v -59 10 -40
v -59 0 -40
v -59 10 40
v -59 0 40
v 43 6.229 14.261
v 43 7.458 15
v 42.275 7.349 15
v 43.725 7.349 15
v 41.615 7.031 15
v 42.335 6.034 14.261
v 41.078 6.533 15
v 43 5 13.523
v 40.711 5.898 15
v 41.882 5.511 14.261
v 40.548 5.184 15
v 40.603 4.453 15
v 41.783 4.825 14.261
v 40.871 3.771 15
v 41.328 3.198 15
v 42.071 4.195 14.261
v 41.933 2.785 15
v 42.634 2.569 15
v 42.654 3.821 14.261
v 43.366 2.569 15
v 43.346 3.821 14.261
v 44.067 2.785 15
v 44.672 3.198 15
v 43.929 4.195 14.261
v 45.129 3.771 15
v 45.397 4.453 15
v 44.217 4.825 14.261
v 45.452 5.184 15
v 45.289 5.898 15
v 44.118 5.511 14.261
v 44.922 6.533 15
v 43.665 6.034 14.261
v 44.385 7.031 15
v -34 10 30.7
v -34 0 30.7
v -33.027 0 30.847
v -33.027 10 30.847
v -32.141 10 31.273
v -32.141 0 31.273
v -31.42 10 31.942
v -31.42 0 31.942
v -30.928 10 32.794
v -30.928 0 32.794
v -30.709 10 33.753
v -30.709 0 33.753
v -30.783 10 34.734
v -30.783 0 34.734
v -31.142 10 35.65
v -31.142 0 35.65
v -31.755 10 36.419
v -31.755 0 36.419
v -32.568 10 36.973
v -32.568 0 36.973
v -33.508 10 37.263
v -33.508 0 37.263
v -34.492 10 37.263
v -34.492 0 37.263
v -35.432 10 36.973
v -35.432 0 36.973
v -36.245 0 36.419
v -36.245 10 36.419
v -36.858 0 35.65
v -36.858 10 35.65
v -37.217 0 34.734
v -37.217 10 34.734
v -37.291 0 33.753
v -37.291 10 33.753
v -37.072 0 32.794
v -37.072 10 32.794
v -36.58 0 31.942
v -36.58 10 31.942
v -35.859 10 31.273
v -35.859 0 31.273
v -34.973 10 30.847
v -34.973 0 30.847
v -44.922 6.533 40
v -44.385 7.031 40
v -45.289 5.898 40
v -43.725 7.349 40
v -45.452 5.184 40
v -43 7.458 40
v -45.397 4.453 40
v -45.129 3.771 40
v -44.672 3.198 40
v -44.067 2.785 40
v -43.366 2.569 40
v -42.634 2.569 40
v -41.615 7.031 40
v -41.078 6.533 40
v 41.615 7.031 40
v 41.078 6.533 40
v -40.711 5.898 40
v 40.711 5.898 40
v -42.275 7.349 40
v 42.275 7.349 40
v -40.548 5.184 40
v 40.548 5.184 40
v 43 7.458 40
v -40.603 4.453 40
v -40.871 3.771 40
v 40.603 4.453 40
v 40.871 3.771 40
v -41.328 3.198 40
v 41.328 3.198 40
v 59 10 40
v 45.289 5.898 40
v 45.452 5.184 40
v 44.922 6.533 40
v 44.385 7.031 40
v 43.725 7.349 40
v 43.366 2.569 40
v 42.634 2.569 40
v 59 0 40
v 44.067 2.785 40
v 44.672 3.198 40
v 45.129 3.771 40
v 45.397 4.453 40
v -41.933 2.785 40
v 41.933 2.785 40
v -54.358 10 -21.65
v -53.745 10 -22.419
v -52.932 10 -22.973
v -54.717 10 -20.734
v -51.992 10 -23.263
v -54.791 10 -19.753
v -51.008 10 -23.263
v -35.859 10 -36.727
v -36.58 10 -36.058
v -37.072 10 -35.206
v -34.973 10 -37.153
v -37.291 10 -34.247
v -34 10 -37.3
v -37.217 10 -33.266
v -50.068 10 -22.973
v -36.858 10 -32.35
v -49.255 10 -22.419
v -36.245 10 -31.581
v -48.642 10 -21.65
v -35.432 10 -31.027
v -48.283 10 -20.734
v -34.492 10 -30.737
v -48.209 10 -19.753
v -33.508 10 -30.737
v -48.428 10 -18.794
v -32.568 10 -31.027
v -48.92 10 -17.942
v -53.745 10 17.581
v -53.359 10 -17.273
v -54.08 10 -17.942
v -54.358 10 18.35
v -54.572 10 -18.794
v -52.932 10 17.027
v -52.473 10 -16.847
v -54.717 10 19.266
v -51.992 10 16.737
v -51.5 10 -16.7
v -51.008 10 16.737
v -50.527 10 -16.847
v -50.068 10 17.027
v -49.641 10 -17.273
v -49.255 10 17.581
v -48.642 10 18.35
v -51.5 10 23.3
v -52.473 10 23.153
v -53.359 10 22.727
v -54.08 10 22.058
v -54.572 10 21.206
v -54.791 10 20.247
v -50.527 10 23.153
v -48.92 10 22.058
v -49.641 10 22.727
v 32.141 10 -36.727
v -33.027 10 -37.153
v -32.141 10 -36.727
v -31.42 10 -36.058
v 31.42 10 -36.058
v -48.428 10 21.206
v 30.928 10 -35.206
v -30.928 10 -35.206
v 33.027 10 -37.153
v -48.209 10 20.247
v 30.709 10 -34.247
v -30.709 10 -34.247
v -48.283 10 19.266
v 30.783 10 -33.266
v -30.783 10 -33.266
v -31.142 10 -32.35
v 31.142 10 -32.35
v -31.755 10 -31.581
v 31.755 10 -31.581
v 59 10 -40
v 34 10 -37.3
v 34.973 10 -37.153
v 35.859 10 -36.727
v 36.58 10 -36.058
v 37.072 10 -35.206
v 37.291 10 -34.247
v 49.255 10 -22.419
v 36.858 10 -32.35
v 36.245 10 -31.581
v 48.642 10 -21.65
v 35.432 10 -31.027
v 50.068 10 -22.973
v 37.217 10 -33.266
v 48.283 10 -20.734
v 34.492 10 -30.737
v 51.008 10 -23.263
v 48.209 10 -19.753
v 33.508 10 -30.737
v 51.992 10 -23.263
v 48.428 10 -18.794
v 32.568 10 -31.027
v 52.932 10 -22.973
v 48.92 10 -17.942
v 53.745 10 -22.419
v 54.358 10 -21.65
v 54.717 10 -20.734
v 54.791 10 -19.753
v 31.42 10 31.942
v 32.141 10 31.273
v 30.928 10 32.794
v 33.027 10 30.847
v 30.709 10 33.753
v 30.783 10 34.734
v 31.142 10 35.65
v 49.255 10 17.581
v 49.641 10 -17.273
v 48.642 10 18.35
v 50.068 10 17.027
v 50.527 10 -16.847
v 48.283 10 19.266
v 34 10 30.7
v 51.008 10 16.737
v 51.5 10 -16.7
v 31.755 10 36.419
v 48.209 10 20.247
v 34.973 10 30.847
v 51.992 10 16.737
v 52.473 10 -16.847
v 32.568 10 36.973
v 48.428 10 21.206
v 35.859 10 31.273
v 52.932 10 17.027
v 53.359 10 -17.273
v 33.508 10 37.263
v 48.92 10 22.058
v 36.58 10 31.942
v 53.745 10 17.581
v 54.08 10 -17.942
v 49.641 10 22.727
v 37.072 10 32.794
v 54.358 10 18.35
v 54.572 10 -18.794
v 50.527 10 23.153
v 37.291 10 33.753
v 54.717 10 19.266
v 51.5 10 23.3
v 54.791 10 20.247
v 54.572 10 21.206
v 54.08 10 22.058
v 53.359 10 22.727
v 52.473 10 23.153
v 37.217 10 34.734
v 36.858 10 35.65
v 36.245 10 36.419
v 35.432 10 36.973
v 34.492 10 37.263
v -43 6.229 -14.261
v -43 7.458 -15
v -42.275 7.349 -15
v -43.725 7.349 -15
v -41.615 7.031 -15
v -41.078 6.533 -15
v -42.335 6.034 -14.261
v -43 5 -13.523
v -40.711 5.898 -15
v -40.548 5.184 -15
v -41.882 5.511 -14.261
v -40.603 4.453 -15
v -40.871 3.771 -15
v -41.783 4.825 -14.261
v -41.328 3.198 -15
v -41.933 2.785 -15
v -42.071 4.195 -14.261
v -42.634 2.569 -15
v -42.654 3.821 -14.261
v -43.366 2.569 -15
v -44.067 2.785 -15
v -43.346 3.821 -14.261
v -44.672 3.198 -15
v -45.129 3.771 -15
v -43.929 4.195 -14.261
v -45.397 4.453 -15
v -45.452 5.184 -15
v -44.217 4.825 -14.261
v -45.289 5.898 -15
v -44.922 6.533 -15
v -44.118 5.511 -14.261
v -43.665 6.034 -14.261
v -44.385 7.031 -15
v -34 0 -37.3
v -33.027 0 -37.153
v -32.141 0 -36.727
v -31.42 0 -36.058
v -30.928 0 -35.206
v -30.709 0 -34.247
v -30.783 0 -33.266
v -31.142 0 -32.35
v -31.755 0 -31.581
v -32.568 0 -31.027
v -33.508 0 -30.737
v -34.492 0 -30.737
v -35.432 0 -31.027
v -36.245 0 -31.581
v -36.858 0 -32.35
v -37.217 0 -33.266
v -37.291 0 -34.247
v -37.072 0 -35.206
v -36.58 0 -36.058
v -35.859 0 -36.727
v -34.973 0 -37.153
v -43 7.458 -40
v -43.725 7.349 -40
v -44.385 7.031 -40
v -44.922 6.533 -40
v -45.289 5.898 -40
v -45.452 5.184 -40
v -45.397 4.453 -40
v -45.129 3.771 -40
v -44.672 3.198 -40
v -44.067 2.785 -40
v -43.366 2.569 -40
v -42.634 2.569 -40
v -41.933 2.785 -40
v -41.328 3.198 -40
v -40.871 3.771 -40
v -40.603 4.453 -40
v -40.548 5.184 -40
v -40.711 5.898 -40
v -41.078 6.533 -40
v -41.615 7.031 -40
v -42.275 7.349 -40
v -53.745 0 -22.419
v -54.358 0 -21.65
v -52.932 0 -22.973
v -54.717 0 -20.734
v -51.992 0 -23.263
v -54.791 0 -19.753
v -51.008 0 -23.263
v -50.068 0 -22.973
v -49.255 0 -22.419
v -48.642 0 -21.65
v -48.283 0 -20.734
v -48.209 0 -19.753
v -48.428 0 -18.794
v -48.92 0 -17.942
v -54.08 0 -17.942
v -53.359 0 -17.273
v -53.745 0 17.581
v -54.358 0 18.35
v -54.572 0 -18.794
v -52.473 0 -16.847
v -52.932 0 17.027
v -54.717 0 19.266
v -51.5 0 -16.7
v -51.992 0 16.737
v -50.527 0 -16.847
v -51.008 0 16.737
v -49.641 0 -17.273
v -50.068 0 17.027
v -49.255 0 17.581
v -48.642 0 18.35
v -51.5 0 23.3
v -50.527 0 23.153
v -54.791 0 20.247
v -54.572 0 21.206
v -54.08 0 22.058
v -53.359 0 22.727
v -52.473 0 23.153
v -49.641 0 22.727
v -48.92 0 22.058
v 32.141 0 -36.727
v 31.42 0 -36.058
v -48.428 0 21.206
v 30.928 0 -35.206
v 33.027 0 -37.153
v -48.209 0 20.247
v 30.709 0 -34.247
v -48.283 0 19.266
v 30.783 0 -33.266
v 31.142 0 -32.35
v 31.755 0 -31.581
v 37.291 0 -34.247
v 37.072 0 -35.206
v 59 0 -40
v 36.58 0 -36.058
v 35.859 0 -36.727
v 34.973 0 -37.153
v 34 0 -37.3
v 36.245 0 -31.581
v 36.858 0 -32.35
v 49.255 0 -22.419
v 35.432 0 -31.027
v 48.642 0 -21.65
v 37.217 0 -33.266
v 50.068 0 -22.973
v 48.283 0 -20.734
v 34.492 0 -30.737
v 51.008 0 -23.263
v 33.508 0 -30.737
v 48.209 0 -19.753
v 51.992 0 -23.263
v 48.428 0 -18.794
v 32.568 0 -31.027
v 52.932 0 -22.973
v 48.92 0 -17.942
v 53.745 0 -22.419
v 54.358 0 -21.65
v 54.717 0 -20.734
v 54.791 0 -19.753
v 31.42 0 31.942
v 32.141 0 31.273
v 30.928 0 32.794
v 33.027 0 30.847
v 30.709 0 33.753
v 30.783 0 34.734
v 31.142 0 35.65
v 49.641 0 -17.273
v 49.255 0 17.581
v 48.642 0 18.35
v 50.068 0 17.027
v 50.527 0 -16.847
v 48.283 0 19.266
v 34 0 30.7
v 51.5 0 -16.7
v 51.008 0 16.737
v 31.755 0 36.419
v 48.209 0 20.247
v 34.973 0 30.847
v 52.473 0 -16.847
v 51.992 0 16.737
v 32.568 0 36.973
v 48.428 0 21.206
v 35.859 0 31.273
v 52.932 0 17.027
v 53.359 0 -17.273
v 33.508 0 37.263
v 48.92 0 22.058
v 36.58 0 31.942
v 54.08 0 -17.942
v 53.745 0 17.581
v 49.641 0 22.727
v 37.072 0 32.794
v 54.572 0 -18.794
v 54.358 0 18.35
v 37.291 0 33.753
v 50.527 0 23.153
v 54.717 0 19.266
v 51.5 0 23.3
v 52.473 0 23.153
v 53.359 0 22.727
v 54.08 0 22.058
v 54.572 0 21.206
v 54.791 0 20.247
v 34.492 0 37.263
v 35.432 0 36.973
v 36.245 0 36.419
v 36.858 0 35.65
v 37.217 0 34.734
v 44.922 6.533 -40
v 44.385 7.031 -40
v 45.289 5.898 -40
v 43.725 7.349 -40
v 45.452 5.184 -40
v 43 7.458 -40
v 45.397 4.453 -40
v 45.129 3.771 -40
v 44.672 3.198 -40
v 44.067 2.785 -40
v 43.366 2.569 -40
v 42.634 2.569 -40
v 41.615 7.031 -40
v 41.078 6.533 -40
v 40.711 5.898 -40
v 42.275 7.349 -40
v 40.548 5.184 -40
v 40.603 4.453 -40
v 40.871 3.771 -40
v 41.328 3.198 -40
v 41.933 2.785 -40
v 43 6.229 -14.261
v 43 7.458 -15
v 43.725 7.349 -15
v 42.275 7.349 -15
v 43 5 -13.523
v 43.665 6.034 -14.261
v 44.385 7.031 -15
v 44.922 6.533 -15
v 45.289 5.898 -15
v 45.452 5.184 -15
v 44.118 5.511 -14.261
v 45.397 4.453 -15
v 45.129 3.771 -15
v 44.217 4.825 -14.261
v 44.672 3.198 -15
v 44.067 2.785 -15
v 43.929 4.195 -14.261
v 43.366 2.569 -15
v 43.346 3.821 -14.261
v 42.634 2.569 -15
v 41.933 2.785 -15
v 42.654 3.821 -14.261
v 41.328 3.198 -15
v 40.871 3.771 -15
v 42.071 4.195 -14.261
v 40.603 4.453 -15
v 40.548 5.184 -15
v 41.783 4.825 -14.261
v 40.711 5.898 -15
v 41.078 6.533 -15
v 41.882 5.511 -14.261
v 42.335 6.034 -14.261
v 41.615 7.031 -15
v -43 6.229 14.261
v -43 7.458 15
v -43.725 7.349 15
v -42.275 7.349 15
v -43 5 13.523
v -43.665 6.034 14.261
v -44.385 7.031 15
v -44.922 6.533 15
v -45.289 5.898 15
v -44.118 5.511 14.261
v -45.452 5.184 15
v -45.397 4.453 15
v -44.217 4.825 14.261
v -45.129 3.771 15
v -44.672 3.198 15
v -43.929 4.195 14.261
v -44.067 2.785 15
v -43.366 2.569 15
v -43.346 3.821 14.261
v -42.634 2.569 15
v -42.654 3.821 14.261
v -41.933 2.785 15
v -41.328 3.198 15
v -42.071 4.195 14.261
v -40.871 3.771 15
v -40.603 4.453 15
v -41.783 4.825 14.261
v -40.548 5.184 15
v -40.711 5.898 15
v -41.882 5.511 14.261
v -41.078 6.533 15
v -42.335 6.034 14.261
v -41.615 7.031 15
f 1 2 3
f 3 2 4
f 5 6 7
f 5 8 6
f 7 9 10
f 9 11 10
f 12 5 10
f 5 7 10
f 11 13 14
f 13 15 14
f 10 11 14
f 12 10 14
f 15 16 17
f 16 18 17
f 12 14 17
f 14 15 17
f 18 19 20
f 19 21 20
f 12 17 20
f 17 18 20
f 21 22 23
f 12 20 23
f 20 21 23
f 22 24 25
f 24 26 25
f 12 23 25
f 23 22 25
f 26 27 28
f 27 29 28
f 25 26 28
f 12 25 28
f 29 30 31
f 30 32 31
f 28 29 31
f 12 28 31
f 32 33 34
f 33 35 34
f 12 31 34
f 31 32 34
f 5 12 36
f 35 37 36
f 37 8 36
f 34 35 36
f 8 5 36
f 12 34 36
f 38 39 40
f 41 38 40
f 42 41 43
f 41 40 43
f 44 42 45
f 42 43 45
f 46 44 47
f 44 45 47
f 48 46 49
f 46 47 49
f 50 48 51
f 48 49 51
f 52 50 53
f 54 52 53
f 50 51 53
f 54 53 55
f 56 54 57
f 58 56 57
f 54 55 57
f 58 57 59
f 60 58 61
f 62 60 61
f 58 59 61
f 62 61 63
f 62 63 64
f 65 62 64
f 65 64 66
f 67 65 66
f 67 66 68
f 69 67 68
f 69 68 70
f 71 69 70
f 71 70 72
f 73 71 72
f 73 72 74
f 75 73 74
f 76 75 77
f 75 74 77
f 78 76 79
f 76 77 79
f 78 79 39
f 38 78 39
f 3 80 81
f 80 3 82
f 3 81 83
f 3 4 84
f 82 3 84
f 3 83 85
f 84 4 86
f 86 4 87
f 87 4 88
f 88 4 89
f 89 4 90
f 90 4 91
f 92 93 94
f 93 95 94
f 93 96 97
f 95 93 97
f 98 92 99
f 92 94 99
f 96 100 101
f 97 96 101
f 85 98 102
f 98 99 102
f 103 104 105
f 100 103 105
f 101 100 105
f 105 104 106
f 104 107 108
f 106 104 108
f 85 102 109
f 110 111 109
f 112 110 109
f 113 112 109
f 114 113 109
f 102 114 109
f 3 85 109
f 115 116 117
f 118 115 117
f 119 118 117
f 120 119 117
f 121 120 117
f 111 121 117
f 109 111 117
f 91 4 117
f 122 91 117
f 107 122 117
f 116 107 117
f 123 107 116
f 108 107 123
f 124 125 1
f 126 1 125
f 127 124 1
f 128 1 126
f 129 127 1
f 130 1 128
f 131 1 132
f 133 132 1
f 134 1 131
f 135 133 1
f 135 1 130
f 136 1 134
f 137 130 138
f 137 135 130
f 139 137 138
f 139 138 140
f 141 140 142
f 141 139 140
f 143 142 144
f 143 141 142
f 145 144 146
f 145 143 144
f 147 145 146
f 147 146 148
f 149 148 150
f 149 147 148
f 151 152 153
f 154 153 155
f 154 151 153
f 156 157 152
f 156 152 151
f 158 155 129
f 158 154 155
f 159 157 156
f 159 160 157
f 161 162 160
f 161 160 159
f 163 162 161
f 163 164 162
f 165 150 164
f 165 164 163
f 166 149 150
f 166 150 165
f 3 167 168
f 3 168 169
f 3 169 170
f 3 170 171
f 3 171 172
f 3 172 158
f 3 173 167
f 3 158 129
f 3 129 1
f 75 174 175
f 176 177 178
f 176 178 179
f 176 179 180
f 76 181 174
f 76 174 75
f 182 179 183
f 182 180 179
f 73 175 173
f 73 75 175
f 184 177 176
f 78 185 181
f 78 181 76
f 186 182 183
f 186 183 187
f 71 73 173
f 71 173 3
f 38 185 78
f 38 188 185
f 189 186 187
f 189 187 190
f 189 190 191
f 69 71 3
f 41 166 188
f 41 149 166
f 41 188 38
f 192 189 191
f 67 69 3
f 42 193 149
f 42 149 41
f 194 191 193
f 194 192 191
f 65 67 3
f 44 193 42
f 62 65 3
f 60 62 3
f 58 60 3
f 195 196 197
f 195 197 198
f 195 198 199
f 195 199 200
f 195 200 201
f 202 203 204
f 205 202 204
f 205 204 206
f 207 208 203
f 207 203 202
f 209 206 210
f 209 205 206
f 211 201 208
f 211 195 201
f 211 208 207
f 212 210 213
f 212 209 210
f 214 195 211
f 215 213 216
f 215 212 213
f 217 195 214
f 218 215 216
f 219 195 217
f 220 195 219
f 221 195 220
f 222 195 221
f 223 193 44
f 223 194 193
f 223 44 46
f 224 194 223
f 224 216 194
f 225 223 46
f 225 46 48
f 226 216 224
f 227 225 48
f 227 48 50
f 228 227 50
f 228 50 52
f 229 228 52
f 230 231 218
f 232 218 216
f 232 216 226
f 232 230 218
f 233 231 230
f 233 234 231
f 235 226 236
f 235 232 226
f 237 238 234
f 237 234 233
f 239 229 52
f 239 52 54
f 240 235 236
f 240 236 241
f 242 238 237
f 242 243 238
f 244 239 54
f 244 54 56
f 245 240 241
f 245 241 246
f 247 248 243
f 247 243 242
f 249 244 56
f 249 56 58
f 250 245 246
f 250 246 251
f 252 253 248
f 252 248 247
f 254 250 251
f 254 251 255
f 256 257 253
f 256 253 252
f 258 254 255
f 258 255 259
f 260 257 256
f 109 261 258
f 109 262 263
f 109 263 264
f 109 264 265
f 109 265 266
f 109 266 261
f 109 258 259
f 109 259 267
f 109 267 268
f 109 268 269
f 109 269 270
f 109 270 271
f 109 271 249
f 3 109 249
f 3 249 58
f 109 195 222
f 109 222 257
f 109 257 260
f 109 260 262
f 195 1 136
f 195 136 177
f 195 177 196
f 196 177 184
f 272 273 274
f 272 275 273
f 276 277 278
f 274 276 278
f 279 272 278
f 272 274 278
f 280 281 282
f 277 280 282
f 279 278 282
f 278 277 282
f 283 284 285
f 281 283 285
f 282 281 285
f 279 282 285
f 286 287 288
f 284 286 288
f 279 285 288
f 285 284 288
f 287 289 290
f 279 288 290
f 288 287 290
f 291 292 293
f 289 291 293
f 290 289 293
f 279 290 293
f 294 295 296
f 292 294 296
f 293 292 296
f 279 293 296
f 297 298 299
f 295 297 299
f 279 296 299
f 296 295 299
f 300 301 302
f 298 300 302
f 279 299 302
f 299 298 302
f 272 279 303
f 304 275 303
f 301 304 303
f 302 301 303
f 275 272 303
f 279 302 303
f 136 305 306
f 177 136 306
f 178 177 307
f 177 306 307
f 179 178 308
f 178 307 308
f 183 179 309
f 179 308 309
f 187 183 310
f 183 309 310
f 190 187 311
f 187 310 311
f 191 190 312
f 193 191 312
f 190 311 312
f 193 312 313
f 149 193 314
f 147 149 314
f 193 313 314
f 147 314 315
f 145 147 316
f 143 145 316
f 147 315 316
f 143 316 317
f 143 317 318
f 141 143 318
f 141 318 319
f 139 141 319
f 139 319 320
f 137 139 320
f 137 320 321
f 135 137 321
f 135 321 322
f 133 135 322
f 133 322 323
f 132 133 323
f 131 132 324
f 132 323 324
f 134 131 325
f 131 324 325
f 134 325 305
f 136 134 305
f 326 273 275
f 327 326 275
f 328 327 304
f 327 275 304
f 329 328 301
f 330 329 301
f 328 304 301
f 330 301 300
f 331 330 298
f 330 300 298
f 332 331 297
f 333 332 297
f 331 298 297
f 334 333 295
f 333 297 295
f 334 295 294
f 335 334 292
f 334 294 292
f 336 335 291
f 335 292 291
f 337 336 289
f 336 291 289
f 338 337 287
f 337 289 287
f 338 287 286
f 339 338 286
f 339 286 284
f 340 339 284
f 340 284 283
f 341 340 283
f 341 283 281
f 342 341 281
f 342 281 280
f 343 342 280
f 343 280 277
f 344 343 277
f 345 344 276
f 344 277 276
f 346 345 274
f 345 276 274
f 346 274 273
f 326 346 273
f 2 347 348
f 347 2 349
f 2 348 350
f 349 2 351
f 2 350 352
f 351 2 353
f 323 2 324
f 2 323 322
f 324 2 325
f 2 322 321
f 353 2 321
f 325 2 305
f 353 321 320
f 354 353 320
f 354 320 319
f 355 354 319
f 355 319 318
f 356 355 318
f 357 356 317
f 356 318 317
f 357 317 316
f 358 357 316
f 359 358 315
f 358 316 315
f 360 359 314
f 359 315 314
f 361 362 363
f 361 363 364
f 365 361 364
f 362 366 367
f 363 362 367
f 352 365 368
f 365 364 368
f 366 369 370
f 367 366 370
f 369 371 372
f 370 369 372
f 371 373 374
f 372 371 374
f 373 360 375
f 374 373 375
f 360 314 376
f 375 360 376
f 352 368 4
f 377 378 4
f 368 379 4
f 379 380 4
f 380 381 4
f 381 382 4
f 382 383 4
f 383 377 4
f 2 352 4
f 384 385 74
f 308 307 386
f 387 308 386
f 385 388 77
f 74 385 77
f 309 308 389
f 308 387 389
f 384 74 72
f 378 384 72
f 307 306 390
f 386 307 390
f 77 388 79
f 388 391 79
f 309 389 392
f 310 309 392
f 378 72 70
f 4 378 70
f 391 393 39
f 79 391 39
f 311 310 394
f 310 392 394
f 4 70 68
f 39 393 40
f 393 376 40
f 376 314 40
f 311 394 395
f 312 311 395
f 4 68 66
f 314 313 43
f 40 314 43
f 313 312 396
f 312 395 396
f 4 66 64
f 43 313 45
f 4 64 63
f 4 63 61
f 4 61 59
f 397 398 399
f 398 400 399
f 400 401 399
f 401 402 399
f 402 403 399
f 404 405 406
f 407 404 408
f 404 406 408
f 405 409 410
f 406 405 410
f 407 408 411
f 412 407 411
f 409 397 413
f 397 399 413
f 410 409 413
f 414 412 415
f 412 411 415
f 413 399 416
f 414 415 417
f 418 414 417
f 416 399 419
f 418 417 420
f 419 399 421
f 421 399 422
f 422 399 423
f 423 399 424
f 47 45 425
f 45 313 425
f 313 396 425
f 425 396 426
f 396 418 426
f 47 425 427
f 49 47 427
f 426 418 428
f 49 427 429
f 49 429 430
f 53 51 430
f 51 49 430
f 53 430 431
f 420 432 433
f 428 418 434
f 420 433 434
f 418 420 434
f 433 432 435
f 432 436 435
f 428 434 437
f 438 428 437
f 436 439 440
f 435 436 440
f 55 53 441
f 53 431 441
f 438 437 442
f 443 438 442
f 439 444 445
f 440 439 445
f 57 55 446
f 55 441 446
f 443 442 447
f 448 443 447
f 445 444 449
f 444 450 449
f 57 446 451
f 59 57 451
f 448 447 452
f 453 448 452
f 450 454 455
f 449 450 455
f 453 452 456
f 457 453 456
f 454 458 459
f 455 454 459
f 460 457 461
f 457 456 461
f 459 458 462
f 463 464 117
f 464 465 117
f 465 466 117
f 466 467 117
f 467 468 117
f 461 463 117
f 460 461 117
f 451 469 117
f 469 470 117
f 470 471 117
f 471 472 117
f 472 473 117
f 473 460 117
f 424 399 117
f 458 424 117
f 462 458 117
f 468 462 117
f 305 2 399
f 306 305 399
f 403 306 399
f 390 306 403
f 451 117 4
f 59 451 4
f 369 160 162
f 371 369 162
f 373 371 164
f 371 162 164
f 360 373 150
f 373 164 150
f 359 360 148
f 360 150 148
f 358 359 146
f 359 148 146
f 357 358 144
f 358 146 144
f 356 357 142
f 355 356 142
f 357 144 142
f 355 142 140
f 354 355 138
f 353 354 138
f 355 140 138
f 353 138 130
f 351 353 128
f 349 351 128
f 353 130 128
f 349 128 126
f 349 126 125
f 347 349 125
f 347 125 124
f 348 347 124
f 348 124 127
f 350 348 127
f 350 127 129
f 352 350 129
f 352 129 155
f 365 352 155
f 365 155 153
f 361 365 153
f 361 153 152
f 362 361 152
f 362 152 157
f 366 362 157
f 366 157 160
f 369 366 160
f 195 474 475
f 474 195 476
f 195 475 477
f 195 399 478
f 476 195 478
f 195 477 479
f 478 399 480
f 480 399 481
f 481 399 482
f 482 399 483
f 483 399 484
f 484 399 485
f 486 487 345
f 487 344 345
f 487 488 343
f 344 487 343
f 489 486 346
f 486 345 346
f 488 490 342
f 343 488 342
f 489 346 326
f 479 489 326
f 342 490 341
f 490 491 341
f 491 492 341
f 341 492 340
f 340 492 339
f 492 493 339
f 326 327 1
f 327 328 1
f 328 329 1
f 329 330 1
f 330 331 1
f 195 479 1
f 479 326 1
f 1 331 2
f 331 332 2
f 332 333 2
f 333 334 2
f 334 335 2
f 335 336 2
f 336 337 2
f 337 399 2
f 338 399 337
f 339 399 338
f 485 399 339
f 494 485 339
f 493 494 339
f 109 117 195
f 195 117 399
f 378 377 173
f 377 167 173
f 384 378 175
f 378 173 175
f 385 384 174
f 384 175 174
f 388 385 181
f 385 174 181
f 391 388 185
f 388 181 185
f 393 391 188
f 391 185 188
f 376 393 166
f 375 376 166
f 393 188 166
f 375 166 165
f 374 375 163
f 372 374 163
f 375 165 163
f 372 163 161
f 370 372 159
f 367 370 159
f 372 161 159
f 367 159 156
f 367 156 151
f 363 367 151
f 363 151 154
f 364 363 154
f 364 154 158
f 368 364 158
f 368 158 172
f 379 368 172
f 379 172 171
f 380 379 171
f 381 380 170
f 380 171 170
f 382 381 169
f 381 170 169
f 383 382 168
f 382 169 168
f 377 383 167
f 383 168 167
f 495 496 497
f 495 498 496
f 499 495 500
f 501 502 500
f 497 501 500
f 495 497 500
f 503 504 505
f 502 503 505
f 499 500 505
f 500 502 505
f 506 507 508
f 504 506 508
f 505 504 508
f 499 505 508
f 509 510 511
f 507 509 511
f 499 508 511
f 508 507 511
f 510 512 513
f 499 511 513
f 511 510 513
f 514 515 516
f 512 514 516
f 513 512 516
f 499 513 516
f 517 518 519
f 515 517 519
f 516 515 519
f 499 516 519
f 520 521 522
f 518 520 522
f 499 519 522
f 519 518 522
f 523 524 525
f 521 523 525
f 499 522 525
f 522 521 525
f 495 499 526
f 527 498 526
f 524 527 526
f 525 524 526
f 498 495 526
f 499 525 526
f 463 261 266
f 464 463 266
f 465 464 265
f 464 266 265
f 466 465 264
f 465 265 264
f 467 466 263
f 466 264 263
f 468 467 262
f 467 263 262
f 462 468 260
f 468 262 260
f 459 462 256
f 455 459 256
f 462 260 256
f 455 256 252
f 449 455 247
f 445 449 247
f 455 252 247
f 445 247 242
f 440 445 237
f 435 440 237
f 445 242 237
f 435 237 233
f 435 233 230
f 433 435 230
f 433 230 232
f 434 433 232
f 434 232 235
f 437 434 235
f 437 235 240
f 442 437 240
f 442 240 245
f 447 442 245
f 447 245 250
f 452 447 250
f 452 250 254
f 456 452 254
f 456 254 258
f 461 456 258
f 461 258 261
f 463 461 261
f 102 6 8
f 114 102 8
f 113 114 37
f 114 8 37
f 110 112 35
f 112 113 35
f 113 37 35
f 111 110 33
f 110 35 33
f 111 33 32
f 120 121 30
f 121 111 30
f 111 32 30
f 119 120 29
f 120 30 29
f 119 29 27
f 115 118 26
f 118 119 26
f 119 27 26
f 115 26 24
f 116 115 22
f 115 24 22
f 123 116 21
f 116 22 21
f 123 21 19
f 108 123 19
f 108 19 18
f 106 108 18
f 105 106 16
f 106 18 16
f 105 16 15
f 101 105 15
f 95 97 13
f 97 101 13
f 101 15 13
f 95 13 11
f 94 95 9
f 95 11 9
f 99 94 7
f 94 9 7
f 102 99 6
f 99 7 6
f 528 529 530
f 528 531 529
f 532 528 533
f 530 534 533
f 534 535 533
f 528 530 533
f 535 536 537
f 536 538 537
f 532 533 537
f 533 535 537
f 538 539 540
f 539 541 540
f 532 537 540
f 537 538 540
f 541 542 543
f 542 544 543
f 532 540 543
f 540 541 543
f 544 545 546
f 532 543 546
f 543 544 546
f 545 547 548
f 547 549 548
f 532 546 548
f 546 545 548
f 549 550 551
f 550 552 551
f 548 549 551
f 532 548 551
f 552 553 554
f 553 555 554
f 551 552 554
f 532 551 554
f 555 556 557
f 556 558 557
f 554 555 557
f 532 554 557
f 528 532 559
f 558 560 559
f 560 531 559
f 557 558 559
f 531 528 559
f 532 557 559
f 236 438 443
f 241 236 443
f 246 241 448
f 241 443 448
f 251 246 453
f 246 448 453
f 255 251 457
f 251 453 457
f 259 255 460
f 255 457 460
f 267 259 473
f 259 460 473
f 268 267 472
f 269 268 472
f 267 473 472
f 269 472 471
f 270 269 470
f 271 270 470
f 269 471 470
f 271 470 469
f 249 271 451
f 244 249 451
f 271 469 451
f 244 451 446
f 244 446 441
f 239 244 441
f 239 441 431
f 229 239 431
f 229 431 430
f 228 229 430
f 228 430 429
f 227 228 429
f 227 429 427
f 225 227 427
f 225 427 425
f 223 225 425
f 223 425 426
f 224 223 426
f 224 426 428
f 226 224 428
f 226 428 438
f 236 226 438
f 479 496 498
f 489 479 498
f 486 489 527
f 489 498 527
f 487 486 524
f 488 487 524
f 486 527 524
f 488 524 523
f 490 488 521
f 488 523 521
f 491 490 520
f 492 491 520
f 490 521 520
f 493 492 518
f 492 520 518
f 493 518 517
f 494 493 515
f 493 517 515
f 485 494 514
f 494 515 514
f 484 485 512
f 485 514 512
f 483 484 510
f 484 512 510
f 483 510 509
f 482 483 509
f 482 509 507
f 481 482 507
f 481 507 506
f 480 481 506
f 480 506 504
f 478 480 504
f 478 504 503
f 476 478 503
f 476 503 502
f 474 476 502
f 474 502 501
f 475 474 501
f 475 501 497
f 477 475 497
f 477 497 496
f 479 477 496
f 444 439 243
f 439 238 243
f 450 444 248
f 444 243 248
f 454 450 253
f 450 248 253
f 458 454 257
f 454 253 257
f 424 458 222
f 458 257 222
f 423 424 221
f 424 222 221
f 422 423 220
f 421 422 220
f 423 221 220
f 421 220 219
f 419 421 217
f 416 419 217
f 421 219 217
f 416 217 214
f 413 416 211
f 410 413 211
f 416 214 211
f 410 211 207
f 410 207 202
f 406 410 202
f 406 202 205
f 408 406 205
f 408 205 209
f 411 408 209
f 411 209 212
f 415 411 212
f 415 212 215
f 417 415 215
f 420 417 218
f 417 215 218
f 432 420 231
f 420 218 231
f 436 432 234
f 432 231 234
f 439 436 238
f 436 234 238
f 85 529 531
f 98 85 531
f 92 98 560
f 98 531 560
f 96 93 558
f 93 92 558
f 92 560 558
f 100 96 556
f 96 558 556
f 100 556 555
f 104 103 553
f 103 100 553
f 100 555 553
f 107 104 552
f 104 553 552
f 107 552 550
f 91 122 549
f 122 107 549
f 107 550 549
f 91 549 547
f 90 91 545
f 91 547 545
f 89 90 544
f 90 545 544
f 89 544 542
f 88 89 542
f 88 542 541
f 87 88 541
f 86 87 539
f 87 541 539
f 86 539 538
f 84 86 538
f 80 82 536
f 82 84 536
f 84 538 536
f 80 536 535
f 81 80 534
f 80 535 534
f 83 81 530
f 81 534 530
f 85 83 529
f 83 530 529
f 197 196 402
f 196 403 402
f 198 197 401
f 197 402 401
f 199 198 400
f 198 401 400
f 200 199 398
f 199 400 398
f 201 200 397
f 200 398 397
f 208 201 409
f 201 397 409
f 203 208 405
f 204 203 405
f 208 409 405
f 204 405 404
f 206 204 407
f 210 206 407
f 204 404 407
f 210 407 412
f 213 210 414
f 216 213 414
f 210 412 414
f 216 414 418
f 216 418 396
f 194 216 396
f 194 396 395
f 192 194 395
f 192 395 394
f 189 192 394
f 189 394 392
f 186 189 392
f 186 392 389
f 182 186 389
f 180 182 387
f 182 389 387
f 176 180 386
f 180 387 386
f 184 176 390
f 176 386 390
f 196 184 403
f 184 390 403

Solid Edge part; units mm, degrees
sketch "Sketch1" plane through (0, 0, 0) normal (0, -1, 0) x (1, 0, 0)
  line L0 (-59, -40) -> (-59, 40)
  line L1 (-59, 40) -> (59, 40)
  line L2 (59, 40) -> (59, -40)
  line L3 (59, -40) -> (-59, -40)
extrude "Protrusion1" add sketch "Sketch1" against normal blind 10
extrude "Extrusionsausschnitt_1" [suppressed]
hole "Bohrung_1" at (34, 0, -34) direction (0, 1, 0) diameter 6.6 end up to next
hole "Hole1" at (-34, 0, -34) direction (0, 1, 0) diameter 6.6 end up to next
hole "Hole2" at (-34, 0, 34) direction (0, 1, 0) diameter 6.6 end up to next
hole "Hole3" at (34, 0, 34) direction (0, 1, 0) diameter 6.6 end up to next
hole "Bohrung_5" at (51.5, 10, -20) direction (0, -1, 0) diameter 6.6 end up to next
hole "Hole4" at (-51.5, 10, -20) direction (0, -1, 0) diameter 6.6 end up to next
hole "Hole5" at (-51.5, 10, 20) direction (0, -1, 0) diameter 6.6 end up to next
hole "Hole6" at (51.5, 10, 20) direction (0, -1, 0) diameter 6.6 end up to next
hole "Bohrung_9" at (43, 5, -40) direction (0, 0, 1) diameter 4.917 depth 25 tip angle 118 thread major 6 thread length 20
hole "Hole7" at (-43, 5, -40) direction (0, 0, 1) diameter 4.917 depth 25 tip angle 118 thread major 6 thread length 20
mirror "Mirror1" about plane through (0, 0, 0) normal (0, 0, -1) of "Bohrung_9", "Hole7"
